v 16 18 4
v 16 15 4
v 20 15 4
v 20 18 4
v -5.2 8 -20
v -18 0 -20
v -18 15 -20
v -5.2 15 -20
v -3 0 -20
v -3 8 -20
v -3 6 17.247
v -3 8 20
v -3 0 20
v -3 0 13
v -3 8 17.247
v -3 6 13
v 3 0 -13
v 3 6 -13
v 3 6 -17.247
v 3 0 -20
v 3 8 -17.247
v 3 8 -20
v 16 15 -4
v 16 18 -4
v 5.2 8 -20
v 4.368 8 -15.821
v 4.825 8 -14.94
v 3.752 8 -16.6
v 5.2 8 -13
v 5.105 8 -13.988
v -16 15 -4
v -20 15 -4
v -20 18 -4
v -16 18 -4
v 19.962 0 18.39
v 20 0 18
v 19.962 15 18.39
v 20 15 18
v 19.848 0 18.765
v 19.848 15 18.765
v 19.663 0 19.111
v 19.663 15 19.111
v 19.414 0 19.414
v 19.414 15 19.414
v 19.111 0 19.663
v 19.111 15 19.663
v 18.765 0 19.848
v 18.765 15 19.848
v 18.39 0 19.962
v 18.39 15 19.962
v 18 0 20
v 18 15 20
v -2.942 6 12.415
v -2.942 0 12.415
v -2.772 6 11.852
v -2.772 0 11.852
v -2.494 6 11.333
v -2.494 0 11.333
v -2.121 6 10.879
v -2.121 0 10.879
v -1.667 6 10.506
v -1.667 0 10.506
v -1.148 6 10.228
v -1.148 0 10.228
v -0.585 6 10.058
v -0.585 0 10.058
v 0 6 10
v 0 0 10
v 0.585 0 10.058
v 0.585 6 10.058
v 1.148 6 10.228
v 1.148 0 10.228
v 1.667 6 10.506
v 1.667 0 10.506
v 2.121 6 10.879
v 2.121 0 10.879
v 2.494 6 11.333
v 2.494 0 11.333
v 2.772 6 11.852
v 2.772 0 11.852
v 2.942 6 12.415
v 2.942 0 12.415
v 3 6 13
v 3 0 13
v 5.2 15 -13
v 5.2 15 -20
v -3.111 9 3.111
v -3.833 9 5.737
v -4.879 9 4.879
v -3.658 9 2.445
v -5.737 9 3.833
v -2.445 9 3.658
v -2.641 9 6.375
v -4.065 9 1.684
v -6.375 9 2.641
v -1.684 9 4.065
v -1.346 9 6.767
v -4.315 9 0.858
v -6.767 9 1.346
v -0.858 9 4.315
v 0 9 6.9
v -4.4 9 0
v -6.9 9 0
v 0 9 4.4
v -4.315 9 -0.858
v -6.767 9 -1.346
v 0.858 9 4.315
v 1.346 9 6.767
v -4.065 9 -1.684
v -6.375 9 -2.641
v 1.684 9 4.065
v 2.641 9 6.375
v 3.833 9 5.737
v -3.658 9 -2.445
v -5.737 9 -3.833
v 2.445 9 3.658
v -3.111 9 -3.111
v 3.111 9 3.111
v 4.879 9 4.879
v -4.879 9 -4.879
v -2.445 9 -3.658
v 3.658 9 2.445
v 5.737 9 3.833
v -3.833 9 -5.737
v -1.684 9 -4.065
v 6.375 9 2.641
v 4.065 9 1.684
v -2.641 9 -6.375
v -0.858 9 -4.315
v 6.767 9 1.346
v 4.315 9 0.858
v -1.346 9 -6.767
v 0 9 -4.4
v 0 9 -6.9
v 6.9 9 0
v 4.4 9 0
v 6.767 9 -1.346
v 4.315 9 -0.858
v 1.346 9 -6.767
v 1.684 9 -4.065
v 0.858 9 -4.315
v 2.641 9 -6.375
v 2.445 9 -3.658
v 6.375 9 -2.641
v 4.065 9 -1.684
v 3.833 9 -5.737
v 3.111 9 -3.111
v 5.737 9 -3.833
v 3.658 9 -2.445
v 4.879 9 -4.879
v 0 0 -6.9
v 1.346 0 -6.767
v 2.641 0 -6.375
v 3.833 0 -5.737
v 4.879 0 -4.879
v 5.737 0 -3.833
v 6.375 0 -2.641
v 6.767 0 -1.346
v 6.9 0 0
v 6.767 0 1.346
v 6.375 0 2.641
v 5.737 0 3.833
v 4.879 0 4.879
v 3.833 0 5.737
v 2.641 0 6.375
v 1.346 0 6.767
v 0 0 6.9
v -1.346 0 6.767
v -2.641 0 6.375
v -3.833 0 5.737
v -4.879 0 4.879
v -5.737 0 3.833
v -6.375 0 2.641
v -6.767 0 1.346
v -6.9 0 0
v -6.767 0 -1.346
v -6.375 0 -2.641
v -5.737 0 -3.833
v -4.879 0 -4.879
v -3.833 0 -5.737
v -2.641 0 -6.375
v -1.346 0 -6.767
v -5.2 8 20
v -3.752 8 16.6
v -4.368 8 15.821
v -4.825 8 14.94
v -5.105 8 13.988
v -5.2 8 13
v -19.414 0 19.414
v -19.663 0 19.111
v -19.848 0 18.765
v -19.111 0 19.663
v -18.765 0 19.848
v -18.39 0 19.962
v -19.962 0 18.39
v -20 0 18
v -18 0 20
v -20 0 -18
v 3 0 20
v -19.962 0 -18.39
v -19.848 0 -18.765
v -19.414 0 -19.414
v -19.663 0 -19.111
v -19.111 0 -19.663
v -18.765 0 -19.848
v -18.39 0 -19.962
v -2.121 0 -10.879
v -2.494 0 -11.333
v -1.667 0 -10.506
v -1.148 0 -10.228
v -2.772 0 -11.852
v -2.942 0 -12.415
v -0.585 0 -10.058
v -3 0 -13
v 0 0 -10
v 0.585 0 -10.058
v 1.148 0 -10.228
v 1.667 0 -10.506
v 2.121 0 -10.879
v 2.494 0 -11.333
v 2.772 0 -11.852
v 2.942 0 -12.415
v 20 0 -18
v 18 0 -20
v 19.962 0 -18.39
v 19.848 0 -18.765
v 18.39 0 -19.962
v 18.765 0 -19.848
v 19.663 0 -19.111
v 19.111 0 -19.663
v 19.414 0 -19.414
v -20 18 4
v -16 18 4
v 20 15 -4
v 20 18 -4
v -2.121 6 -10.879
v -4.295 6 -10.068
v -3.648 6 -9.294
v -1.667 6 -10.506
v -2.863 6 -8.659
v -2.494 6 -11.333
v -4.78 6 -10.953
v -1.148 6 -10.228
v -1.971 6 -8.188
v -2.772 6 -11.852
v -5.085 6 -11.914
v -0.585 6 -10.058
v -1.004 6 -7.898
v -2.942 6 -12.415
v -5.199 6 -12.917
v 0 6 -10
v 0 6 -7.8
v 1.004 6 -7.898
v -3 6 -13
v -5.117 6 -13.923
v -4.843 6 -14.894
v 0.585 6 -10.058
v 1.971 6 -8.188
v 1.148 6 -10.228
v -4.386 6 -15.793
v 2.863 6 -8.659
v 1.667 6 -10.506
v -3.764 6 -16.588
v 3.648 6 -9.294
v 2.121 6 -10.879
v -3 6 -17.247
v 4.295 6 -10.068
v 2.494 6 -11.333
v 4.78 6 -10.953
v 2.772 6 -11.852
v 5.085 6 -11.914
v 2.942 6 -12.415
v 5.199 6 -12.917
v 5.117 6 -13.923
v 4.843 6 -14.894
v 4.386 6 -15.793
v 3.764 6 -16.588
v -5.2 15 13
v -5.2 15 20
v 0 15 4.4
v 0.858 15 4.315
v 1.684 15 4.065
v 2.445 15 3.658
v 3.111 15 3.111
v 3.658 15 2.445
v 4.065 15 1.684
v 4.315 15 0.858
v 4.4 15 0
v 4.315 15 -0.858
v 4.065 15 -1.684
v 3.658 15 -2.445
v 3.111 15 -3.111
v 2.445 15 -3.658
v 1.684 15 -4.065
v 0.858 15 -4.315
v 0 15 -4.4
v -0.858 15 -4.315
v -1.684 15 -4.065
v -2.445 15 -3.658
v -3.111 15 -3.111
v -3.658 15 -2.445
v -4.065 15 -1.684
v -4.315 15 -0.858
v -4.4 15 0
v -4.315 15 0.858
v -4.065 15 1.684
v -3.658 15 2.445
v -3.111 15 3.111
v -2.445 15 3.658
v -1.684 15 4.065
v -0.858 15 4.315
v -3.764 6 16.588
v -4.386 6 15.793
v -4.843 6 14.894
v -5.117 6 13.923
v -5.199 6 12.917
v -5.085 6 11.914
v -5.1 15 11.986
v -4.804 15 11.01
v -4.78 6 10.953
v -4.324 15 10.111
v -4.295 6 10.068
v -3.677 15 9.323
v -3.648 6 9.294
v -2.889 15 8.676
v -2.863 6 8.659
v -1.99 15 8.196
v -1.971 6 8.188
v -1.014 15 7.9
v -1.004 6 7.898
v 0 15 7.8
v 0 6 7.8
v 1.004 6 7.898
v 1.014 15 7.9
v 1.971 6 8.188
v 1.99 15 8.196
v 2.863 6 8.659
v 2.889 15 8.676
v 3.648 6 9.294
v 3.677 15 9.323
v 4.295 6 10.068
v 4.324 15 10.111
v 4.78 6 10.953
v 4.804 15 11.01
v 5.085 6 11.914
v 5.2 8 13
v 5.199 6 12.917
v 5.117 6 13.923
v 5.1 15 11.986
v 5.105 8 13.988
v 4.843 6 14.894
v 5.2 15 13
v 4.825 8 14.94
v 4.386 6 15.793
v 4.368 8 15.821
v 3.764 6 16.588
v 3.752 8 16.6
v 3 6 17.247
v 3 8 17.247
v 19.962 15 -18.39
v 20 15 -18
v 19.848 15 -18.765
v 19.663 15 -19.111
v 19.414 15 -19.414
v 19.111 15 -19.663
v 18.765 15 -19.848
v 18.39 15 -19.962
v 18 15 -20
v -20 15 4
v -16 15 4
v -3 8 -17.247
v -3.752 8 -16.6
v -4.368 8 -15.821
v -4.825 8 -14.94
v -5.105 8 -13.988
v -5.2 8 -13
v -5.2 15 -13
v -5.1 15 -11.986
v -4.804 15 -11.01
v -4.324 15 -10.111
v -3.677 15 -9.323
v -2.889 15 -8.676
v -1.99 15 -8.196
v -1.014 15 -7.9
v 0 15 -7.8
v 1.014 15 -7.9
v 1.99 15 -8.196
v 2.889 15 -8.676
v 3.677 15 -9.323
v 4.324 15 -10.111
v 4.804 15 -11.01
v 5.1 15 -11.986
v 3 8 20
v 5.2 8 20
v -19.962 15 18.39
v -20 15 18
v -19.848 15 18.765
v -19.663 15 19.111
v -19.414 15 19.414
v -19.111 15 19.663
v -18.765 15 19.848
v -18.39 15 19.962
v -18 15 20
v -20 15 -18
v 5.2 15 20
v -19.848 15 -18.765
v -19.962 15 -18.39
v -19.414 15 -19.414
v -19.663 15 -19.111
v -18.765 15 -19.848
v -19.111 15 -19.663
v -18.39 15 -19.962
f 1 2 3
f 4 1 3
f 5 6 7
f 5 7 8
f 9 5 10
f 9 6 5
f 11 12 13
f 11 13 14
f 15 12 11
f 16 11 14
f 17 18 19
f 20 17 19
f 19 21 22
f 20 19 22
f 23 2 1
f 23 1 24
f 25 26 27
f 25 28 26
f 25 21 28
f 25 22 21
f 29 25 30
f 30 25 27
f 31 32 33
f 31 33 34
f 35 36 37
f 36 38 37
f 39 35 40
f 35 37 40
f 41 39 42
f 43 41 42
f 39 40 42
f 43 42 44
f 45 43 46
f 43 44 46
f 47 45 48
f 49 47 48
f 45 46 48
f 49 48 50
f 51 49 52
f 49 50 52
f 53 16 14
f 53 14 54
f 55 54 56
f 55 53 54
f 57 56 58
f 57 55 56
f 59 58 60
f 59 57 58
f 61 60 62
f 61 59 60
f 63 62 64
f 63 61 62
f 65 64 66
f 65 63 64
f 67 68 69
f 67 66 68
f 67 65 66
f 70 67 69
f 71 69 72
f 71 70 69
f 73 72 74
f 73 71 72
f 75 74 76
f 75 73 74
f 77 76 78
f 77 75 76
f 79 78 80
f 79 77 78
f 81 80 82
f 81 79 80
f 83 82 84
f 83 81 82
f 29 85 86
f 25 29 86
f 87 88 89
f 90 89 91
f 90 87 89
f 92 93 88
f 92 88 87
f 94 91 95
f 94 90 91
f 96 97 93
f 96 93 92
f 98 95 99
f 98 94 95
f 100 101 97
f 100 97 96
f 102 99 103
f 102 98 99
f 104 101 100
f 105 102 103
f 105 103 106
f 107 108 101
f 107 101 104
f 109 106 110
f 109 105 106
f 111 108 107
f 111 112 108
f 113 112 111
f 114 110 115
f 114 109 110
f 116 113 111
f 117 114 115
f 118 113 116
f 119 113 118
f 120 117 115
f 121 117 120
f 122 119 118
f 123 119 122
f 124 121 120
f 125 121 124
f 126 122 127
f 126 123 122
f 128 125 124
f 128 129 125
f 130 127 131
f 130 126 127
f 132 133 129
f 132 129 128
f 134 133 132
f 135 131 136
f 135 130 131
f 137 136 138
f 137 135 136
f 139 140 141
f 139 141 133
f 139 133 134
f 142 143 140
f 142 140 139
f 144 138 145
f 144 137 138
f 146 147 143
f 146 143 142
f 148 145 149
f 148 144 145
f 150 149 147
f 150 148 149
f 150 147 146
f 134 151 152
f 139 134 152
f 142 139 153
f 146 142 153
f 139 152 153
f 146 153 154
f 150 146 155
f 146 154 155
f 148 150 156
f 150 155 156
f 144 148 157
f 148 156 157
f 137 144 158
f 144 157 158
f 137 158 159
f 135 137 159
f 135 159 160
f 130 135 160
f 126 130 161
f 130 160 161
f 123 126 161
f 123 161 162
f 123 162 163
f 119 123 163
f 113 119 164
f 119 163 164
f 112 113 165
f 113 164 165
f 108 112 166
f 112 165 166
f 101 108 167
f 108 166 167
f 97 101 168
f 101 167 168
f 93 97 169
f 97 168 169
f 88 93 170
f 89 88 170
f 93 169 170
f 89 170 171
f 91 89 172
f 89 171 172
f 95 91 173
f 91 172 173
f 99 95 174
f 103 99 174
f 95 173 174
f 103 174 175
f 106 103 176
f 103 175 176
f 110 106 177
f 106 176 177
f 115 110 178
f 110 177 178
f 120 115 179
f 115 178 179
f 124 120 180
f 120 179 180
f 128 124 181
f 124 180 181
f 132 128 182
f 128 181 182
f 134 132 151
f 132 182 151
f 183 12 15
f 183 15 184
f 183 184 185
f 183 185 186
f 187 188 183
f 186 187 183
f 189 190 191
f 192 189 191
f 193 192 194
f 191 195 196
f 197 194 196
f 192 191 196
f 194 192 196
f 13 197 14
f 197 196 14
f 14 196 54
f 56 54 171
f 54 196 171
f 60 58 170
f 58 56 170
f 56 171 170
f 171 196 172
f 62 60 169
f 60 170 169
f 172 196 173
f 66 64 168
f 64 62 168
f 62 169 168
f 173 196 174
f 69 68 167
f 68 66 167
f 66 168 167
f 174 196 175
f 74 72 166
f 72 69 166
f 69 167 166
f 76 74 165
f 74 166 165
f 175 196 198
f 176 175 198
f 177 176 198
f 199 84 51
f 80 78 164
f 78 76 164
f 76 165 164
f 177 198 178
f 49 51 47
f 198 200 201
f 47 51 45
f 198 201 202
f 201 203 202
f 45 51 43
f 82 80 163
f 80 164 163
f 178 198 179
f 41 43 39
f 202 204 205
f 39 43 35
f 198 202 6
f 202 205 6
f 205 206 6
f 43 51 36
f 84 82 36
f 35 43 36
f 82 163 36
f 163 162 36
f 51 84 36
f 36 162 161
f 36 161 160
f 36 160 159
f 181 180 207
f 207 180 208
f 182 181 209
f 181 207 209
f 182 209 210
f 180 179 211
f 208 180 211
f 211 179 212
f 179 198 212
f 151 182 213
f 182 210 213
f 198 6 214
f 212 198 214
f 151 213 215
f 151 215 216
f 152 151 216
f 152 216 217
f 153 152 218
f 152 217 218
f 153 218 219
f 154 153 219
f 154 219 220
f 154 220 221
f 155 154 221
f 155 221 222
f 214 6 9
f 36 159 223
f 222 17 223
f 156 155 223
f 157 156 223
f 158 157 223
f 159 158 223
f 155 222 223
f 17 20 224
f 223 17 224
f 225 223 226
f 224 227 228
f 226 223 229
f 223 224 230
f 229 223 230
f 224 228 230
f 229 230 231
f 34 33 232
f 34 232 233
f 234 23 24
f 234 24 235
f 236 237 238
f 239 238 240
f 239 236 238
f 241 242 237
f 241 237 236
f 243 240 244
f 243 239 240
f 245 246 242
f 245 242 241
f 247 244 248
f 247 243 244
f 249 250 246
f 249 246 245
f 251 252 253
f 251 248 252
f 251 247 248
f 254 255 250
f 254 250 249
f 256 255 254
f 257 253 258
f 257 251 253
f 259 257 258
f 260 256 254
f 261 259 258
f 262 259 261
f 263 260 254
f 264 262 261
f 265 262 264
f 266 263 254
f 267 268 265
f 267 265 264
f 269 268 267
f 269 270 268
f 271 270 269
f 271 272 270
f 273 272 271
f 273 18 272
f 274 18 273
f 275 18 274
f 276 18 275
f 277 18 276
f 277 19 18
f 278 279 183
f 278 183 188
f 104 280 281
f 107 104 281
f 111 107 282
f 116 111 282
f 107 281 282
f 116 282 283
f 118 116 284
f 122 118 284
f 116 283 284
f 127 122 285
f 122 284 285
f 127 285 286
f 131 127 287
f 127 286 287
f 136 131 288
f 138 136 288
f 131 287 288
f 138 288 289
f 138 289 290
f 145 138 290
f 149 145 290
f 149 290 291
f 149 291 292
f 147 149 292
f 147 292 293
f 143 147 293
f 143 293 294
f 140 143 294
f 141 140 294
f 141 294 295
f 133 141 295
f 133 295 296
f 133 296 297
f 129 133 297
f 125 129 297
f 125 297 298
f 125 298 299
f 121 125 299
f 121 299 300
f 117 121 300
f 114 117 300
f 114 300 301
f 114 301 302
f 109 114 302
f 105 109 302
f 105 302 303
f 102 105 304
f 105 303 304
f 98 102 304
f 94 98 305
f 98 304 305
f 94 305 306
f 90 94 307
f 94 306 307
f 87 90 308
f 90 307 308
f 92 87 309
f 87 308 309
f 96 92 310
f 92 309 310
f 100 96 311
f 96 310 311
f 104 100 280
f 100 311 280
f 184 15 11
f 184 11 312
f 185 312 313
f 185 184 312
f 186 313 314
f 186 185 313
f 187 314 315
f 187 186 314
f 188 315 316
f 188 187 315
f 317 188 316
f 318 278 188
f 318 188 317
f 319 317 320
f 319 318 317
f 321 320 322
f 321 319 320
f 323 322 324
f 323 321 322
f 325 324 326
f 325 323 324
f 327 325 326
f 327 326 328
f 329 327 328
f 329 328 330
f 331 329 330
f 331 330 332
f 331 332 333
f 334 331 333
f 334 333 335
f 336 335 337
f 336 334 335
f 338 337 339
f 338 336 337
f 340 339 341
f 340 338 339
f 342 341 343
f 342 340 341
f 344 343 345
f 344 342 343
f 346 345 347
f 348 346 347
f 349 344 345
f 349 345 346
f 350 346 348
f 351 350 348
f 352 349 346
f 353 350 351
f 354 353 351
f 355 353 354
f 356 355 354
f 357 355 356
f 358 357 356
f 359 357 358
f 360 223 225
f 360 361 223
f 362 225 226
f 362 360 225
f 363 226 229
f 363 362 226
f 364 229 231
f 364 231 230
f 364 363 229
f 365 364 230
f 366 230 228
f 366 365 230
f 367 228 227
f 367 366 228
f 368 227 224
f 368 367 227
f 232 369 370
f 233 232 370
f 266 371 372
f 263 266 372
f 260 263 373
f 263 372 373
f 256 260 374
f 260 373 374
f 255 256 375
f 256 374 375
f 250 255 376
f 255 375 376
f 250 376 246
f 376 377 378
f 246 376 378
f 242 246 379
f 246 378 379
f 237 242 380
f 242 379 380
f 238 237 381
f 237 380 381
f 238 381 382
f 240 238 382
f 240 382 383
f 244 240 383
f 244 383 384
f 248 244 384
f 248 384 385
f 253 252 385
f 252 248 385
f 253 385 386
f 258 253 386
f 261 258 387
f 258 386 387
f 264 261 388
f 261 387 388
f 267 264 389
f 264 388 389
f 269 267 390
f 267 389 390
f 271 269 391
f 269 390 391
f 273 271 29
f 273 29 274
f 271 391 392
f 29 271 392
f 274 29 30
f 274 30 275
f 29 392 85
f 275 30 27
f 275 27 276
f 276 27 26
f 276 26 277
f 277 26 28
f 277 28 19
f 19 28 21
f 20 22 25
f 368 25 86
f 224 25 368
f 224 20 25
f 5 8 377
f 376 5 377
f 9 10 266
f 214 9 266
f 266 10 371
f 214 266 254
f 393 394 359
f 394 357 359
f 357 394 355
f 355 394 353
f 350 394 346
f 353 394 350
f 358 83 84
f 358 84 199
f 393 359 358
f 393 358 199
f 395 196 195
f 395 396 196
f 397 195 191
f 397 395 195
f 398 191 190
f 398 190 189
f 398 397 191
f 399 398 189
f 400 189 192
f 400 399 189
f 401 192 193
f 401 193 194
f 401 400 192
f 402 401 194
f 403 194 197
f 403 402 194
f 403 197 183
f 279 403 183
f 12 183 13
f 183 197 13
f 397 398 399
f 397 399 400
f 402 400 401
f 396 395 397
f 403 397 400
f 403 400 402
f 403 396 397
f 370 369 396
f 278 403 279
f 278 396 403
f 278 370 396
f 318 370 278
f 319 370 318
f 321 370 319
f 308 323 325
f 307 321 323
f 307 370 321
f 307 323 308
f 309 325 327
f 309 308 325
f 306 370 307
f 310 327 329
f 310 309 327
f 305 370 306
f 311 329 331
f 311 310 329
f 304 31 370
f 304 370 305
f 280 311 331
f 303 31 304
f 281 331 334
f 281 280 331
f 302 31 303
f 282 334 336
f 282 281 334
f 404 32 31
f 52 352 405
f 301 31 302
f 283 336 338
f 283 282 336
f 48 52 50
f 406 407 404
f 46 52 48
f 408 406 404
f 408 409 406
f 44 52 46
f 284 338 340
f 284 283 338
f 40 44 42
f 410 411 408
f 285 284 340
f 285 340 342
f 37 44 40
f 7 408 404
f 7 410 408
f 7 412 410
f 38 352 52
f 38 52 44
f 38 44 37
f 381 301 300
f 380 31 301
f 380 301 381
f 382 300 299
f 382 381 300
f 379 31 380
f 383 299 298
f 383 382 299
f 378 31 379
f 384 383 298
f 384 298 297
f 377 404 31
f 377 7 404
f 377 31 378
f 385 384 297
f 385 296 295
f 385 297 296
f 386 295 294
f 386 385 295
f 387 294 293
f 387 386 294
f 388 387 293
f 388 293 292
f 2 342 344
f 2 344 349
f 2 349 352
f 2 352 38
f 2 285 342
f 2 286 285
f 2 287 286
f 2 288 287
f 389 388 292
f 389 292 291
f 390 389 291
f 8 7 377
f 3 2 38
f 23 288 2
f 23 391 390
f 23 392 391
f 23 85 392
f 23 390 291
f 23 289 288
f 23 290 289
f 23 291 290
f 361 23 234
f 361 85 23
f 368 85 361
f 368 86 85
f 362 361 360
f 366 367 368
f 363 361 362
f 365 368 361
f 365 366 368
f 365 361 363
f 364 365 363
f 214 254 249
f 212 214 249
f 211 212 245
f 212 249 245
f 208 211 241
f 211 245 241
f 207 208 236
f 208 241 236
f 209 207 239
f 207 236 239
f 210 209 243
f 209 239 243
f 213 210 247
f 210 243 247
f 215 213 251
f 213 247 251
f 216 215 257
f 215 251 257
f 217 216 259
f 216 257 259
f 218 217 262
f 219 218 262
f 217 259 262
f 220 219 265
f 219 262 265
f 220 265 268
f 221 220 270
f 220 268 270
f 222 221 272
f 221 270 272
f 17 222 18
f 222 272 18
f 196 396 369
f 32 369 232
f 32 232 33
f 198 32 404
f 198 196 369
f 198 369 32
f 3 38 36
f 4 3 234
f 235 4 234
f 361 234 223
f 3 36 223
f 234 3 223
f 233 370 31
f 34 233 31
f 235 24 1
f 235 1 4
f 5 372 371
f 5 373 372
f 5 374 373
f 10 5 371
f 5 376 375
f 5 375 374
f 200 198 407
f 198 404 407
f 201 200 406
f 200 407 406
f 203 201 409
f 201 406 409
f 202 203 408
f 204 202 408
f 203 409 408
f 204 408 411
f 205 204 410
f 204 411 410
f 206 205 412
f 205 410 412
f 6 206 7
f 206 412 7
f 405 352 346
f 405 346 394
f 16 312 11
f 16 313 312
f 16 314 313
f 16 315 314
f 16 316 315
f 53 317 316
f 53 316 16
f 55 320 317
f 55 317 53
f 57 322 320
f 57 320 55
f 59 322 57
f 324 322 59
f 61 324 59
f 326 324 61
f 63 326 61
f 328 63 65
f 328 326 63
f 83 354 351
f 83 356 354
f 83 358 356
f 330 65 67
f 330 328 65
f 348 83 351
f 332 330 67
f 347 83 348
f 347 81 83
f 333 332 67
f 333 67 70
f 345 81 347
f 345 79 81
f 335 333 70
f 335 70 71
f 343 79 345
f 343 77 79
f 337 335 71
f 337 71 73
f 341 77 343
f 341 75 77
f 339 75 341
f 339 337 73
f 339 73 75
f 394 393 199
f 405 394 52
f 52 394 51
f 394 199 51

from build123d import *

# Parameters (mm, degrees)
SKETCH_1_W          = 40
SKETCH_1_H          = 40
EXTRUDE_1_DEPTH     = 15
SKETCH_2_W          = 4
SKETCH_2_H          = 8
EXTRUDE_2_DEPTH     = 3
SKETCH_3_R          = 4.4
CUT_EXTRUDE_1_DEPTH = 16
SKETCH_4_R          = 6.9
CUT_EXTRUDE_2_DEPTH = 9
CUT_EXTRUDE_3_DEPTH = 7
SKETCH_6_R          = 5.2
CUT_EXTRUDE_4_DEPTH = 2
FILLET_1_R          = 2


with BuildPart() as part:
    # Эскиз1 → Бобышка-Вытянуть1 (new body)
    with BuildSketch(Plane(origin=(0, 0, 0), x_dir=(1, 0, 0), z_dir=(0, 1, 0))):
        Rectangle(SKETCH_1_W, SKETCH_1_H)
    extrude(amount=EXTRUDE_1_DEPTH)

    # Эскиз2 → Бобышка-Вытянуть2 (add)
    with BuildSketch(Plane(origin=(0, 15, 0), x_dir=(1, 0, 0), z_dir=(0, 1, 0))):
        with Locations((-18, 0)):
            Rectangle(SKETCH_2_W, SKETCH_2_H)
        with Locations((18, 0)):
            Rectangle(SKETCH_2_W, SKETCH_2_H)
    extrude(amount=EXTRUDE_2_DEPTH)

    # Эскиз3 → Вырез-Вытянуть1 (cut, through all)
    with BuildSketch(Plane(origin=(0, 15, 0), x_dir=(1, 0, 0), z_dir=(0, 1, 0))):
        with Locations(Location((0, 0, 0), (0, 0, 270))):  # turned: the seam where the file's is
            Circle(SKETCH_3_R)
        with BuildLine():
            Line((-3, -20), (-3, -13))
            ThreePointArc((-3, -13), (0, -10), (3, -13))
            Line((3, -13), (3, -20))
            Line((3, -20), (-3, -20))
        make_face()
        with BuildLine():
            Line((3, 13), (3, 20))
            Line((3, 20), (-3, 20))
            Line((-3, 20), (-3, 13))
            ThreePointArc((-3, 13), (0, 10), (3, 13))
        make_face()
    extrude(amount=-CUT_EXTRUDE_1_DEPTH, mode=Mode.SUBTRACT)

    # Эскиз4 → Вырез-Вытянуть2 (cut)
    with BuildSketch(Plane.XZ):
        with Locations(Location((0, 0, 0), (0, 0, 270))):  # turned: the seam where the file's is
            Circle(SKETCH_4_R)
    extrude(amount=-CUT_EXTRUDE_2_DEPTH, mode=Mode.SUBTRACT)

    # Эскиз5 → Вырез-Вытянуть3 (cut)
    with BuildSketch(Plane(origin=(0, 15, 0), x_dir=(1, 0, 0), z_dir=(0, 1, 0))):
        with BuildLine():
            Line((-5.2, -20), (-5.2, -13))
            ThreePointArc((-5.2, -13), (0, -7.8), (5.2, -13))
            Line((5.2, -13), (5.2, -20))
            Line((5.2, -20), (-5.2, -20))
        make_face()
        with BuildLine():
            Line((5.2, 13), (5.2, 20))
            Line((5.2, 20), (-5.2, 20))
            Line((-5.2, 20), (-5.2, 13))
            ThreePointArc((-5.2, 13), (0, 7.8), (5.2, 13))
        make_face()
    extrude(amount=-CUT_EXTRUDE_3_DEPTH, mode=Mode.SUBTRACT)

    # Эскиз6 → Вырез-Вытянуть4 (cut)
    with BuildSketch(Plane(origin=(0, 8, 0), x_dir=(1, 0, 0), z_dir=(0, 1, 0))):
        with Locations((0, -13)):
            Circle(SKETCH_6_R)
        with Locations((0, 13)):
            Circle(SKETCH_6_R)
    extrude(amount=-CUT_EXTRUDE_4_DEPTH, mode=Mode.SUBTRACT)

    # Скругление1
    fillet_1_edges = [part.edges().sort_by_distance(p)[0] for p in [
        (-20, 7.5, -20),
        (20, 7.5, -20),
        (20, 7.5, 20),
        (-20, 7.5, 20),
    ]]
    fillet(fillet_1_edges, radius=FILLET_1_R)


solid = part.part
